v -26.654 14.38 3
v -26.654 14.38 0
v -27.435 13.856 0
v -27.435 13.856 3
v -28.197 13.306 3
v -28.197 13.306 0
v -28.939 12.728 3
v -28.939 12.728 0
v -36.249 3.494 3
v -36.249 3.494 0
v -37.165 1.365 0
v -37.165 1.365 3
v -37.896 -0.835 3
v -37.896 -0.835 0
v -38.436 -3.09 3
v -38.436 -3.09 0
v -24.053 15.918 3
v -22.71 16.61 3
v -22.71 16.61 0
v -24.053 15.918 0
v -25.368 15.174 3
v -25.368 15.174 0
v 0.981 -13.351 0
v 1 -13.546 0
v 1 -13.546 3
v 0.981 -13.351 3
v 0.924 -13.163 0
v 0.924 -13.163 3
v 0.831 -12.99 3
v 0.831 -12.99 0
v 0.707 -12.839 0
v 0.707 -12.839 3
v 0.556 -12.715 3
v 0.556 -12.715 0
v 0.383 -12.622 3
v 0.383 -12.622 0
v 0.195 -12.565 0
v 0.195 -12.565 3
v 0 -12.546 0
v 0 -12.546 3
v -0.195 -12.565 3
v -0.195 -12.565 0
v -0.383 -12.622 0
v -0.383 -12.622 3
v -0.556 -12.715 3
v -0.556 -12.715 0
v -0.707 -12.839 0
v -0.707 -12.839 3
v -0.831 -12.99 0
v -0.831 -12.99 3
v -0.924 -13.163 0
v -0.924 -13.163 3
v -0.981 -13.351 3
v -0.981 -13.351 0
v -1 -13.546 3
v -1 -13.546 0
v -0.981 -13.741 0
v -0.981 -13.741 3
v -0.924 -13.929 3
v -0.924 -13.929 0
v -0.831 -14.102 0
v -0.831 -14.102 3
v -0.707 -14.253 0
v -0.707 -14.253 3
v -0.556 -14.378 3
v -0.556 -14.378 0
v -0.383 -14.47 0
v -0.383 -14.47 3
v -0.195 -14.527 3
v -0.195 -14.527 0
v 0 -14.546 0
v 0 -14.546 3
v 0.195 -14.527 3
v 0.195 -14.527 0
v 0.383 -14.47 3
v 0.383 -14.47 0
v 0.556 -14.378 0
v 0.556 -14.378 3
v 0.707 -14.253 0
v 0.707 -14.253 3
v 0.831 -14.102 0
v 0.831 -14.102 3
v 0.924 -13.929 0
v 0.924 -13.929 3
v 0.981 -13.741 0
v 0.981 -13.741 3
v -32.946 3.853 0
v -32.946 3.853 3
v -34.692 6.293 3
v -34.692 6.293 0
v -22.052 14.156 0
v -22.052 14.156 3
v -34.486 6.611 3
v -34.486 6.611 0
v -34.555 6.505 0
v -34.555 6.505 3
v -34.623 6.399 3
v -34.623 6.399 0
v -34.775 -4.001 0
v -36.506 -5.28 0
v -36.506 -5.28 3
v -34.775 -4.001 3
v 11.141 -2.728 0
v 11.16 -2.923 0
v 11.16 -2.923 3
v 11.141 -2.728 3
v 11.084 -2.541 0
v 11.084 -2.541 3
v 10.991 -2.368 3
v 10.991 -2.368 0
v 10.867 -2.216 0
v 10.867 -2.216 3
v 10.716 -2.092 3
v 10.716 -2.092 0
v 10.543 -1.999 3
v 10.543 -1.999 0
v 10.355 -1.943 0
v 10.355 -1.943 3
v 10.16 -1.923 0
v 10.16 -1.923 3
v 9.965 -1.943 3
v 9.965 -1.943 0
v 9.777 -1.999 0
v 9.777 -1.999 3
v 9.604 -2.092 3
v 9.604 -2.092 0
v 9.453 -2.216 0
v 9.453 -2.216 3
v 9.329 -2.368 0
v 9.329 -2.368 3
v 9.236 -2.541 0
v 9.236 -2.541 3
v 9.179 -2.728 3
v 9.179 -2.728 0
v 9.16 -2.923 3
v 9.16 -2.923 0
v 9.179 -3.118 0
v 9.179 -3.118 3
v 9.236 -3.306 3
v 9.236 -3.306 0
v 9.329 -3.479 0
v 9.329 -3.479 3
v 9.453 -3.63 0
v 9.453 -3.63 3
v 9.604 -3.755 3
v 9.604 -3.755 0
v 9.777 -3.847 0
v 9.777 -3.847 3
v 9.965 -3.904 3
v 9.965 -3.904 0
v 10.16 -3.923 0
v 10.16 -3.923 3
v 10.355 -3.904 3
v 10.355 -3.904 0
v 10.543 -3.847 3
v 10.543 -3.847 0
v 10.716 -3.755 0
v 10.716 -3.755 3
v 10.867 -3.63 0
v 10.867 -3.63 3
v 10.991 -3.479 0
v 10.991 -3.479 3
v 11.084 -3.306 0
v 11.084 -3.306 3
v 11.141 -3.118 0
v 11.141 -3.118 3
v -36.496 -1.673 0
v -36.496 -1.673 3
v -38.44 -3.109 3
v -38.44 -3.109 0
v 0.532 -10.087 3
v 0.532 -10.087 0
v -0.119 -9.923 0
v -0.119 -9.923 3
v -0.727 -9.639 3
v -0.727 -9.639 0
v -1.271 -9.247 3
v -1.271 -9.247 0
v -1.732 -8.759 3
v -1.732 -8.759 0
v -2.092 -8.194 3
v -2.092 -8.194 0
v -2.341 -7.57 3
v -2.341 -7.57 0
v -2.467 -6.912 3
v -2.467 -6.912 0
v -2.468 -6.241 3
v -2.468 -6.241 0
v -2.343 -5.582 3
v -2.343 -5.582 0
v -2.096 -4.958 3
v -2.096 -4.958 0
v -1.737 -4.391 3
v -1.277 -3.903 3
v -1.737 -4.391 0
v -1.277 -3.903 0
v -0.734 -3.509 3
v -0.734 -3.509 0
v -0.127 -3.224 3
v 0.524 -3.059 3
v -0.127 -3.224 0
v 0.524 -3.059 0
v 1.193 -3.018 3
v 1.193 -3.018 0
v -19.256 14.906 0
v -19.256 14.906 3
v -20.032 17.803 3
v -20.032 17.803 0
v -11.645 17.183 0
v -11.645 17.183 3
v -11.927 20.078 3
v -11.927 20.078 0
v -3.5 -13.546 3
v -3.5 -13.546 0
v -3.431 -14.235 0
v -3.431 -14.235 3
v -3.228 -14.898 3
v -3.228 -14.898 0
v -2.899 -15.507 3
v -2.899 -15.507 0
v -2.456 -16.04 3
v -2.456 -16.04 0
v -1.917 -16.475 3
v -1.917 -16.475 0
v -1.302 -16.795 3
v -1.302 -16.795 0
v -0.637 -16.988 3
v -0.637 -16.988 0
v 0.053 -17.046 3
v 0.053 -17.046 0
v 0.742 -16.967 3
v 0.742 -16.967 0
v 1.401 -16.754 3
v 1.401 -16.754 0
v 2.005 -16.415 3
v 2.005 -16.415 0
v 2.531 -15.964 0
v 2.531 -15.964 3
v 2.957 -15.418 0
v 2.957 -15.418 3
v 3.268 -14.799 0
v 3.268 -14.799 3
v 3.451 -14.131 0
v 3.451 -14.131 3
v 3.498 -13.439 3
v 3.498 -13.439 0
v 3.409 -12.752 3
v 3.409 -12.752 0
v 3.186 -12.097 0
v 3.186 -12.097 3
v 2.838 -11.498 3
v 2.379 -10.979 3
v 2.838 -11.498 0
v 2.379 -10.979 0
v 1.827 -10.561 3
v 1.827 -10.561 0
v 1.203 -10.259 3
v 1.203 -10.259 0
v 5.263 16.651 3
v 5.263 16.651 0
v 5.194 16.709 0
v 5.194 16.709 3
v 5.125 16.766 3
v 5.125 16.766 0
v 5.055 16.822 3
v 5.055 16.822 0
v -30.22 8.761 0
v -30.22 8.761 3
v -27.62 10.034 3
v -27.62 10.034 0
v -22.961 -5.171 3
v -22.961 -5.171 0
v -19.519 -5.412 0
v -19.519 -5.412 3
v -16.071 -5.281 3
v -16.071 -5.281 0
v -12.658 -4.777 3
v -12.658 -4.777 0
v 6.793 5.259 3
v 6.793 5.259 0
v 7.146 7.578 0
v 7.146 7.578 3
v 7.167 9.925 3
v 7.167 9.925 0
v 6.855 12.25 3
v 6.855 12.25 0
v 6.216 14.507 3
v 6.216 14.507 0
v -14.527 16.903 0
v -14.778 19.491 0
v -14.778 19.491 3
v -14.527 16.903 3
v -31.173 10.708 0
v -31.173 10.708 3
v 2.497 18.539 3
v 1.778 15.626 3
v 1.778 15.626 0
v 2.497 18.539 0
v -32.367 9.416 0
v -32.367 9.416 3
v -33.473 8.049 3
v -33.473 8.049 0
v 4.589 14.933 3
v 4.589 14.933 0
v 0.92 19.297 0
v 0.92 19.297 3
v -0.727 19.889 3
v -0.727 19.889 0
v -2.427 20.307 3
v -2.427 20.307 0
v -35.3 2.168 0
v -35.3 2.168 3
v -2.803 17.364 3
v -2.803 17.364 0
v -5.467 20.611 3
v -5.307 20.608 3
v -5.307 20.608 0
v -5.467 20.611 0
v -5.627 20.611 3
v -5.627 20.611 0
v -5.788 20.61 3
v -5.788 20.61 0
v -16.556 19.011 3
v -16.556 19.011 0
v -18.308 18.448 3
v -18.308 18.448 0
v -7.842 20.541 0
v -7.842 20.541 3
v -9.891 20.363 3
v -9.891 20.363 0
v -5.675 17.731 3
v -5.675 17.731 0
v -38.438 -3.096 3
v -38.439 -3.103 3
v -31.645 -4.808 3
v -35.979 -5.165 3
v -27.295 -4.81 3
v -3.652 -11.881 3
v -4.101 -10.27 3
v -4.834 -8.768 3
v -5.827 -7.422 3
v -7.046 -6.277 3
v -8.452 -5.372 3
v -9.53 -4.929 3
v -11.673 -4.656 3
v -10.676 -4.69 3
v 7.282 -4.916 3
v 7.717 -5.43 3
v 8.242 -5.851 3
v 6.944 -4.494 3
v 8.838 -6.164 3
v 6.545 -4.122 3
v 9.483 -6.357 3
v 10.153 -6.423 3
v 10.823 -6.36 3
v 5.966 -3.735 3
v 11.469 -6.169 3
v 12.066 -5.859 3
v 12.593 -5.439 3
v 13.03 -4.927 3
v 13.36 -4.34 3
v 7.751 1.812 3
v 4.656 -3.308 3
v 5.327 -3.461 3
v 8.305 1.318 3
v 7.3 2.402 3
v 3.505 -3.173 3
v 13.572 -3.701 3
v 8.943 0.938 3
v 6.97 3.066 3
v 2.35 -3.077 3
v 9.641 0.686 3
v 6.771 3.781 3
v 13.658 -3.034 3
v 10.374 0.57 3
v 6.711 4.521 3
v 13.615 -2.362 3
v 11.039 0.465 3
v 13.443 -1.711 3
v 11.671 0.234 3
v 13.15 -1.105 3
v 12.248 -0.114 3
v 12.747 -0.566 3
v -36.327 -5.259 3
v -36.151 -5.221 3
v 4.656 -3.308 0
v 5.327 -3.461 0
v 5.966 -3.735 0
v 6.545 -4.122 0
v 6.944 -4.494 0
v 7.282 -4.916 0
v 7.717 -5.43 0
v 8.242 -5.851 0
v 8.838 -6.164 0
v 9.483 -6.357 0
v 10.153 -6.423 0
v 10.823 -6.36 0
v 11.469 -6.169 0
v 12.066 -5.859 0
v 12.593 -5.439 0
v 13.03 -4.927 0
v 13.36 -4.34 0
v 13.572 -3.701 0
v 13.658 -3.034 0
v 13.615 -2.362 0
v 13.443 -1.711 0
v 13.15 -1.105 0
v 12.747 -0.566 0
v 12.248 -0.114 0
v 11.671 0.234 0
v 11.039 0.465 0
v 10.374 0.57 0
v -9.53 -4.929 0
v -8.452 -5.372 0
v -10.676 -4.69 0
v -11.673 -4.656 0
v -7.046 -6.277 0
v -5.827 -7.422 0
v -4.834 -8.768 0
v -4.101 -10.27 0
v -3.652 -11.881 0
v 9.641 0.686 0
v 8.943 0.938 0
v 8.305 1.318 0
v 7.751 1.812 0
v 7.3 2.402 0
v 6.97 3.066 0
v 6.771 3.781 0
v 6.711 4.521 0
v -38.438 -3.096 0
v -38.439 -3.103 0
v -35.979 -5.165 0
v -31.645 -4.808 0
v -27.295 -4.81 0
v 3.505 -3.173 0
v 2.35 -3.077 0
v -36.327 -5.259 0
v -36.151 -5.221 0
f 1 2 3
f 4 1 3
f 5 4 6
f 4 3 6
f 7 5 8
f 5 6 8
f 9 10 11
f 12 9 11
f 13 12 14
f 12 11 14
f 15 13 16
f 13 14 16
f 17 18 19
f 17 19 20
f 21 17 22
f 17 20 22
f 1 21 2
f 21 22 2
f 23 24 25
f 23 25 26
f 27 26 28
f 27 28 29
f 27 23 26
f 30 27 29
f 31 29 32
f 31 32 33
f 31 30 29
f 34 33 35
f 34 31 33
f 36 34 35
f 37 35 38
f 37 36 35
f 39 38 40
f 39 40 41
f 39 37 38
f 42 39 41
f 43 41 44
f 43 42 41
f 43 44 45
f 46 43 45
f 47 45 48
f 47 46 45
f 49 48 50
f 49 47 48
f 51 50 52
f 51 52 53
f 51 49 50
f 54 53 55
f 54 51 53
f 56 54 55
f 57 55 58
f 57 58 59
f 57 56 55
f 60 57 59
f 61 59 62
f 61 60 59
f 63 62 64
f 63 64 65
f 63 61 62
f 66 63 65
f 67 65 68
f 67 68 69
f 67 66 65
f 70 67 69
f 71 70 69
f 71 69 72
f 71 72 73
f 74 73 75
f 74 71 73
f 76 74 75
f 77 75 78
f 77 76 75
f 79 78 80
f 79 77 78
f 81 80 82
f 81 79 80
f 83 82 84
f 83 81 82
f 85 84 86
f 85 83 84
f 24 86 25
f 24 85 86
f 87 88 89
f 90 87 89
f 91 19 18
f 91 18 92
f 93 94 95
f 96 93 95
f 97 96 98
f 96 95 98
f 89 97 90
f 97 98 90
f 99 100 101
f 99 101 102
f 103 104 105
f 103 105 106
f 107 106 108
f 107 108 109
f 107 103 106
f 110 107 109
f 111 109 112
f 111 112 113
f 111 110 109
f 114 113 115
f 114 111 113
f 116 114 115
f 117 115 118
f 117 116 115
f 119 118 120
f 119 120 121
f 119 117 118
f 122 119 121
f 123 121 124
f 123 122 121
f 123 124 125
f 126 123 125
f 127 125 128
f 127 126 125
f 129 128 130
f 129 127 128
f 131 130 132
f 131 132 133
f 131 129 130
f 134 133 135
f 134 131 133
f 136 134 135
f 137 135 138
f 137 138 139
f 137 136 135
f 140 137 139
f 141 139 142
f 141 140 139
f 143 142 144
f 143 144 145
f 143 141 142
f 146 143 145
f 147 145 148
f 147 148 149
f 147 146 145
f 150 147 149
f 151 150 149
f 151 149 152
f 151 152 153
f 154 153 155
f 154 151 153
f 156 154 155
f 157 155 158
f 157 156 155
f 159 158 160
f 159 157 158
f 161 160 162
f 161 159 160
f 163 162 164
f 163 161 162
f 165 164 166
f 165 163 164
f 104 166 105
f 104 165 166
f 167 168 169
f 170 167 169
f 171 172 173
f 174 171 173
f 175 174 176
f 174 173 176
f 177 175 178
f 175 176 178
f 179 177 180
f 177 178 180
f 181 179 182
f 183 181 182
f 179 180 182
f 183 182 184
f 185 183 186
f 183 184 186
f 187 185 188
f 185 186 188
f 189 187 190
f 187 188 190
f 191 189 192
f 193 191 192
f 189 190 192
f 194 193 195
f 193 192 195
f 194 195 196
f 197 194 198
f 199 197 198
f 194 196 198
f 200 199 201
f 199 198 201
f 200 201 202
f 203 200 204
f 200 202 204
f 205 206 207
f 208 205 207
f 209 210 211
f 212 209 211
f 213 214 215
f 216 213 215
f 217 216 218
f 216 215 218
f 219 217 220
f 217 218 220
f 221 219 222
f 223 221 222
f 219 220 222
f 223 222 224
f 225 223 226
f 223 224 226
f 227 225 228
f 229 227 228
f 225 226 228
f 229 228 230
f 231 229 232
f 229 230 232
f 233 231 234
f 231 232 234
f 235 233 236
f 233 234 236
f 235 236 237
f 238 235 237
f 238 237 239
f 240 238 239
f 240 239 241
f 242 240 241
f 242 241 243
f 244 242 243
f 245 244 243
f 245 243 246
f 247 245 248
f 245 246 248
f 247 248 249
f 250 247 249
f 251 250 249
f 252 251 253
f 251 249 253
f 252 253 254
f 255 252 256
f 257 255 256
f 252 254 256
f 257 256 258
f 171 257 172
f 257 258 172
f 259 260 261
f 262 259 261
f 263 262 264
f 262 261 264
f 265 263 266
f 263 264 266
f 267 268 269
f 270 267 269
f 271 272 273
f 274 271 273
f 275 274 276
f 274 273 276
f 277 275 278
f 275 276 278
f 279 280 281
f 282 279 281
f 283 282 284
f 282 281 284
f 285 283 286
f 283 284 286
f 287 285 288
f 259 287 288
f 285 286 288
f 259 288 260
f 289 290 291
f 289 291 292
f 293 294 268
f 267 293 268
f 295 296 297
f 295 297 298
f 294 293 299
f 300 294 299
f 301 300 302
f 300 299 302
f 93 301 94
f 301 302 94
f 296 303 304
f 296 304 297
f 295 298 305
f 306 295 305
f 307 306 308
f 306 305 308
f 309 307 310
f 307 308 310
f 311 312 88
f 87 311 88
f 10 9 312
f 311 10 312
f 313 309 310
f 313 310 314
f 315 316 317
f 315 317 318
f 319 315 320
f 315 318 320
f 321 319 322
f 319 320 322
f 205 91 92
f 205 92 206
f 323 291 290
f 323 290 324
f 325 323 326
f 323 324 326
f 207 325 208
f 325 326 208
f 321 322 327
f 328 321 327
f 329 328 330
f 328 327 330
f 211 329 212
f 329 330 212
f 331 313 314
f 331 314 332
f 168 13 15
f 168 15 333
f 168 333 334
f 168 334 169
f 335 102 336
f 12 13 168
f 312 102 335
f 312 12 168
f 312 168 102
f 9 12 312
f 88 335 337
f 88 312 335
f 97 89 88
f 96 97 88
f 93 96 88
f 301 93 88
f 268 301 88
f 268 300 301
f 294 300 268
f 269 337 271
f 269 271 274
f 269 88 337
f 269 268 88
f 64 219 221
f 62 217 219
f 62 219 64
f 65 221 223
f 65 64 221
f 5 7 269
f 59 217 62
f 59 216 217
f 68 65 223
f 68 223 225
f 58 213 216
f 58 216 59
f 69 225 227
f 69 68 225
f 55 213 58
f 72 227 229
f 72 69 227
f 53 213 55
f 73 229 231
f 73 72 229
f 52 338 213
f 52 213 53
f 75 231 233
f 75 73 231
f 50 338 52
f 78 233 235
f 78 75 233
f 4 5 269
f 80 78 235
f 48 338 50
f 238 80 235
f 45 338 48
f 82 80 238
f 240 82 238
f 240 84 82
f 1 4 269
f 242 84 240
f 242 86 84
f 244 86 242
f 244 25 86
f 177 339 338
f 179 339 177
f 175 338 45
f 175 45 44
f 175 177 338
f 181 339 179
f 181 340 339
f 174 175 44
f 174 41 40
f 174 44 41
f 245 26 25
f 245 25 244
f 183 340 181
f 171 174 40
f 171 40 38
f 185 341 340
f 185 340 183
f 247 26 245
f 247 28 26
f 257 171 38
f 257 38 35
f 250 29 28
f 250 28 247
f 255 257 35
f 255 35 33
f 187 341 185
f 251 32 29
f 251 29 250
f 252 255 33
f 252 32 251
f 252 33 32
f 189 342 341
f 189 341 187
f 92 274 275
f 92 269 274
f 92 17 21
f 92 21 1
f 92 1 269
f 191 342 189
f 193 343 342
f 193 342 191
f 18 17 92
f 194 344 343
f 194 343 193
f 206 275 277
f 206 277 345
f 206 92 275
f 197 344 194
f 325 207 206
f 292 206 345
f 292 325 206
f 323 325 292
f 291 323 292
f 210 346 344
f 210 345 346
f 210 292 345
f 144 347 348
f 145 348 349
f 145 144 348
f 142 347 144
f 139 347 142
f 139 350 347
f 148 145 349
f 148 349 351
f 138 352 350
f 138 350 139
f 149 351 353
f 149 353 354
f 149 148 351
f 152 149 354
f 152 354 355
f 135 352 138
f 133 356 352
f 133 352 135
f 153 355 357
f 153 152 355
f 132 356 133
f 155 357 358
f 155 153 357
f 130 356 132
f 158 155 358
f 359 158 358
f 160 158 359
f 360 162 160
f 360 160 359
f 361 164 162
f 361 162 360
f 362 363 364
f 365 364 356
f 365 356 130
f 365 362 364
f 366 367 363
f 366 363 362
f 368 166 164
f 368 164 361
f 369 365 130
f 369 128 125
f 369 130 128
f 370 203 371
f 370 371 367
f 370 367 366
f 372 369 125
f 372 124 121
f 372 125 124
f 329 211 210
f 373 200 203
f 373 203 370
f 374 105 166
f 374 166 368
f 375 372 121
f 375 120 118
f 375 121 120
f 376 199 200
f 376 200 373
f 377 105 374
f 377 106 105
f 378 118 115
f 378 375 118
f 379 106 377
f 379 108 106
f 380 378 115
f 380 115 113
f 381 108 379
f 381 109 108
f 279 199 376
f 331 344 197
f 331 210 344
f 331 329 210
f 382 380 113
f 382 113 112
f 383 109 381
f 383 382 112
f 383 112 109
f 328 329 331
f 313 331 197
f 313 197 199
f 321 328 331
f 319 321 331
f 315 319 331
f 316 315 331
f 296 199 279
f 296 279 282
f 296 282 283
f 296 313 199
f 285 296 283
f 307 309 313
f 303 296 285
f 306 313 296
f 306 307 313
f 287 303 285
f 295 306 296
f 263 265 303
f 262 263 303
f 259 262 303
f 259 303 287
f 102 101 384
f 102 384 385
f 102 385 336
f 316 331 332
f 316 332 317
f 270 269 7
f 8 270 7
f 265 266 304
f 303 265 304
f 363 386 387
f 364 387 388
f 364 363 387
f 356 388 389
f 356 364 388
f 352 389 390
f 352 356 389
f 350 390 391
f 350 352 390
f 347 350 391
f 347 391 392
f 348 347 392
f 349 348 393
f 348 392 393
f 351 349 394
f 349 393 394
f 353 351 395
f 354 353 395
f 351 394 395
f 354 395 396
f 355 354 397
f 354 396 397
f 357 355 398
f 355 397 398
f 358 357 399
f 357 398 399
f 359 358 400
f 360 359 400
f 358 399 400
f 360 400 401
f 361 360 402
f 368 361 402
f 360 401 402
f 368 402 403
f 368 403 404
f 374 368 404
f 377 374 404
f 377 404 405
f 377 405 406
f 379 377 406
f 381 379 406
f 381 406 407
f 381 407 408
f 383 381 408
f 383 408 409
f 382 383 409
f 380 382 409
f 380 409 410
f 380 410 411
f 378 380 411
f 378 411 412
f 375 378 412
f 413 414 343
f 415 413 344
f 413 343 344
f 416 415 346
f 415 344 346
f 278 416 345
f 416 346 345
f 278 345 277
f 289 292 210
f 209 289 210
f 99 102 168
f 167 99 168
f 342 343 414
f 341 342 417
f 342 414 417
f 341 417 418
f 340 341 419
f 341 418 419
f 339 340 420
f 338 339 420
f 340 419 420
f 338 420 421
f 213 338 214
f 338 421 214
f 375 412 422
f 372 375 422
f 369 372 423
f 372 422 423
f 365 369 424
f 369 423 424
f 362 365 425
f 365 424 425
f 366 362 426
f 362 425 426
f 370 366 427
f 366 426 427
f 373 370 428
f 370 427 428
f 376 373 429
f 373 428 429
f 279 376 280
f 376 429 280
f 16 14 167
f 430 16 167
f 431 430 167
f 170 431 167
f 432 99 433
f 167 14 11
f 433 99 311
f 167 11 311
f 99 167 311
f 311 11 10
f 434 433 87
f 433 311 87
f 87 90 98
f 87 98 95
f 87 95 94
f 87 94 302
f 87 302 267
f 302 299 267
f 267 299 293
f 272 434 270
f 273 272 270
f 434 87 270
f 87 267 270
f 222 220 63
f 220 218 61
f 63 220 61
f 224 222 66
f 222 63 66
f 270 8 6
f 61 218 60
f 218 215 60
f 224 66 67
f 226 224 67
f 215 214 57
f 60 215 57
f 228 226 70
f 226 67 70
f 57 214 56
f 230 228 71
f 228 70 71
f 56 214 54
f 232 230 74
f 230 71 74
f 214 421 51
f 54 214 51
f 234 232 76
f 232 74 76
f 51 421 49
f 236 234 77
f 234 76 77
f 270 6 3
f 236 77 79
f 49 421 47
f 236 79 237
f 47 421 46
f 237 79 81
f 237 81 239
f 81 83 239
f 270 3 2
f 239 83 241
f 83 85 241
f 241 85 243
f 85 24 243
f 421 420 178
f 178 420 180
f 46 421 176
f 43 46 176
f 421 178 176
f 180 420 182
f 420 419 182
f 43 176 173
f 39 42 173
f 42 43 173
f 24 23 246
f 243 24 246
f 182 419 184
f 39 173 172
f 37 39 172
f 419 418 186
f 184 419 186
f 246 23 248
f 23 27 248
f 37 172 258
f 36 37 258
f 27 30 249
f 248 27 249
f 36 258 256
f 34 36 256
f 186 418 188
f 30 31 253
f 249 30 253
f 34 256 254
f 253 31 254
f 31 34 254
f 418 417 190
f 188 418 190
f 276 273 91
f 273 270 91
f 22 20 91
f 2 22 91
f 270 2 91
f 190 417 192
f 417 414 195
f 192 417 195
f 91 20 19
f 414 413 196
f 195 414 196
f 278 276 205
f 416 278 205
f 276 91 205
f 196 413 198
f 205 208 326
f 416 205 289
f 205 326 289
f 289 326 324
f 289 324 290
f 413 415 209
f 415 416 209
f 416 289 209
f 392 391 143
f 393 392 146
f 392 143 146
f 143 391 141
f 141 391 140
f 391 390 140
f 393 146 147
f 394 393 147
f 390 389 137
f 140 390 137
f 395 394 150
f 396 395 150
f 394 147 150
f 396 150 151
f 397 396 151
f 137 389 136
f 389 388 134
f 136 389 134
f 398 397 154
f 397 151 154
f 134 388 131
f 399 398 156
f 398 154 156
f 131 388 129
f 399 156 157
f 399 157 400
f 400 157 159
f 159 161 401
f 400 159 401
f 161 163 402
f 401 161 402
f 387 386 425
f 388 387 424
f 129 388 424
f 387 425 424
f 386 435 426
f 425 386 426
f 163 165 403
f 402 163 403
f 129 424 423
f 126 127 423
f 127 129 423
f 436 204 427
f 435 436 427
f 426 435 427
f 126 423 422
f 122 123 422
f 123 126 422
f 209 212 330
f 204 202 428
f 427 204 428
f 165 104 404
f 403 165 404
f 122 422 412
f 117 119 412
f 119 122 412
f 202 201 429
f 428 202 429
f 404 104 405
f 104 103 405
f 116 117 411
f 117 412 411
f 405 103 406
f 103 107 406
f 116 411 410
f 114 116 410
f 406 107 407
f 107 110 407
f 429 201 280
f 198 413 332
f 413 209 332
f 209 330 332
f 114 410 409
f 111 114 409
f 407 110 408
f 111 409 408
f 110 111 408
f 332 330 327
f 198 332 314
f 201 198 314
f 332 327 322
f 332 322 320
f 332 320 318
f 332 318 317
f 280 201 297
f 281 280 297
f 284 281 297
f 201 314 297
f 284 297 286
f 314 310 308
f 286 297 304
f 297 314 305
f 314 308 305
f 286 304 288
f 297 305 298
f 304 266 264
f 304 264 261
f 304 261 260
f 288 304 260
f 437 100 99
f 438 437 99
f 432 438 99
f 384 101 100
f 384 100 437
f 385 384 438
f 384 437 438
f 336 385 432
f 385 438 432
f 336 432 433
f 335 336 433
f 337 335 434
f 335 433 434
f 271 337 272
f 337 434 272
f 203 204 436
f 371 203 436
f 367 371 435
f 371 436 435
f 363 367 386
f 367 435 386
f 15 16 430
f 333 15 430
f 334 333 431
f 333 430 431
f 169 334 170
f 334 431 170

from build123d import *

# Parameters (mm, degrees)
SKETCH_1_R          = 1
EXTRUDE_1_DEPTH     = 3
CUT_EXTRUDE_1_DEPTH = 3
FILLET_1_R          = 6.35
FILLET_2_R          = 3.81


with BuildPart() as part:
    # 스케치1 → 보스-돌출1 (new body)
    with BuildSketch(Plane.XY):
        with BuildLine():
            ThreePointArc((0.531870722, -10.086704765), (-2.468285539, -6.240741756), (1.193231186, -3.018062075))
            ThreePointArc((1.193231186, -3.018062075), (3.977430532, -3.224017026), (6.736428382, -3.650765557))
            ThreePointArc((6.736428382, -3.650765557), (12.811387699, -5.208096803), (10.373680181, 0.570137648))
            ThreePointArc((10.373680181, 0.570137648), (7.511596171, 2.096172534), (6.79289024, 5.259046091))
            ThreePointArc((6.79289024, 5.259046091), (7.052126243, 11.092699457), (5.26272755, 16.651185512))
            ThreePointArc((5.26272755, 16.651185512), (0.091388125, 19.61858906), (-5.787768566, 20.610431722))
            ThreePointArc((-5.787768566, 20.610431722), (-16.663895396, 18.979214467), (-26.65376361, 14.379916953))
            ThreePointArc((-26.65376361, 14.379916953), (-30.97630157, 10.905433837), (-34.485646455, 6.611150914))
            ThreePointArc((-34.485646455, 6.611150914), (-36.933218927, 1.953038955), (-38.436256849, -3.089727649))
            ThreePointArc((-38.436256849, -3.089727649), (-37.817076352, -4.849129426), (-35.97891327, -5.165413449))
            ThreePointArc((-35.97891327, -5.165413449), (-29.469944847, -4.76402142), (-22.96129319, -5.170517559))
            ThreePointArc((-22.96129319, -5.170517559), (-17.052833669, -5.356485804), (-11.211694851, -4.447874001))
            ThreePointArc((-11.211694851, -4.447874001), (-5.68729426, -7.582685682), (-3.5, -13.546056371))
            ThreePointArc((-3.5, -13.546056371), (2.279084517, -16.20232702), (0.531870722, -10.086704765))
        make_face()
        with Locations((10.16, -2.923333517)):
            Circle(SKETCH_1_R, mode=Mode.SUBTRACT)
        with Locations((0, -13.546056371)):
            Circle(SKETCH_1_R, mode=Mode.SUBTRACT)
    extrude(amount=EXTRUDE_1_DEPTH)

    # 스케치3 → 컷-돌출1 (cut)
    with BuildSketch(Plane.XY.offset(3)):
        Polygon((-37.188543837, -5.783898323), (-34.775495789, -4.001428374), (-36.49557929, -1.672837008), (-38.908627338, -3.455306957), align=None)
        Polygon((-35.300313228, 2.168251474), (-32.945896506, 3.852812812), (-34.691555923, 6.292622886), (-37.045972645, 4.608061549), align=None)
        Polygon((-30.219801903, 8.760975192), (-27.619820697, 10.03420837), (-28.939233317, 12.728489413), (-31.539214523, 11.455256235), align=None)
        Polygon((-22.051978234, 14.155956059), (-19.255706545, 14.905549044), (-20.032486841, 17.803239913), (-22.828758529, 17.053646929), align=None)
        Polygon((-14.526759613, 16.903481061), (-11.645327955, 17.183439276), (-11.935440095, 20.169378818), (-14.816871753, 19.889420603), align=None)
        Polygon((-5.294168633, 20.707213916), (-2.42254789, 20.340036428), (-2.803042696, 17.364263637), (-5.674663439, 17.731441125), align=None)
        Polygon((2.496916602, 18.538725662), (5.307614816, 17.845183627), (4.588918406, 14.932542992), (1.778220193, 15.626085027), align=None)
    extrude(amount=-CUT_EXTRUDE_1_DEPTH, mode=Mode.SUBTRACT)

    # 필렛1
    fillet_1_edges = [part.edges().sort_by_distance(p)[0] for p in [
        (-11.211694851, -4.447874001, 1.5),
    ]]
    fillet(fillet_1_edges, radius=FILLET_1_R)

    # 필렛2
    fillet_2_edges = [part.edges().sort_by_distance(p)[0] for p in [
        (6.736428382, -3.650765557, 1.5),
    ]]
    fillet(fillet_2_edges, radius=FILLET_2_R)


solid = part.part
